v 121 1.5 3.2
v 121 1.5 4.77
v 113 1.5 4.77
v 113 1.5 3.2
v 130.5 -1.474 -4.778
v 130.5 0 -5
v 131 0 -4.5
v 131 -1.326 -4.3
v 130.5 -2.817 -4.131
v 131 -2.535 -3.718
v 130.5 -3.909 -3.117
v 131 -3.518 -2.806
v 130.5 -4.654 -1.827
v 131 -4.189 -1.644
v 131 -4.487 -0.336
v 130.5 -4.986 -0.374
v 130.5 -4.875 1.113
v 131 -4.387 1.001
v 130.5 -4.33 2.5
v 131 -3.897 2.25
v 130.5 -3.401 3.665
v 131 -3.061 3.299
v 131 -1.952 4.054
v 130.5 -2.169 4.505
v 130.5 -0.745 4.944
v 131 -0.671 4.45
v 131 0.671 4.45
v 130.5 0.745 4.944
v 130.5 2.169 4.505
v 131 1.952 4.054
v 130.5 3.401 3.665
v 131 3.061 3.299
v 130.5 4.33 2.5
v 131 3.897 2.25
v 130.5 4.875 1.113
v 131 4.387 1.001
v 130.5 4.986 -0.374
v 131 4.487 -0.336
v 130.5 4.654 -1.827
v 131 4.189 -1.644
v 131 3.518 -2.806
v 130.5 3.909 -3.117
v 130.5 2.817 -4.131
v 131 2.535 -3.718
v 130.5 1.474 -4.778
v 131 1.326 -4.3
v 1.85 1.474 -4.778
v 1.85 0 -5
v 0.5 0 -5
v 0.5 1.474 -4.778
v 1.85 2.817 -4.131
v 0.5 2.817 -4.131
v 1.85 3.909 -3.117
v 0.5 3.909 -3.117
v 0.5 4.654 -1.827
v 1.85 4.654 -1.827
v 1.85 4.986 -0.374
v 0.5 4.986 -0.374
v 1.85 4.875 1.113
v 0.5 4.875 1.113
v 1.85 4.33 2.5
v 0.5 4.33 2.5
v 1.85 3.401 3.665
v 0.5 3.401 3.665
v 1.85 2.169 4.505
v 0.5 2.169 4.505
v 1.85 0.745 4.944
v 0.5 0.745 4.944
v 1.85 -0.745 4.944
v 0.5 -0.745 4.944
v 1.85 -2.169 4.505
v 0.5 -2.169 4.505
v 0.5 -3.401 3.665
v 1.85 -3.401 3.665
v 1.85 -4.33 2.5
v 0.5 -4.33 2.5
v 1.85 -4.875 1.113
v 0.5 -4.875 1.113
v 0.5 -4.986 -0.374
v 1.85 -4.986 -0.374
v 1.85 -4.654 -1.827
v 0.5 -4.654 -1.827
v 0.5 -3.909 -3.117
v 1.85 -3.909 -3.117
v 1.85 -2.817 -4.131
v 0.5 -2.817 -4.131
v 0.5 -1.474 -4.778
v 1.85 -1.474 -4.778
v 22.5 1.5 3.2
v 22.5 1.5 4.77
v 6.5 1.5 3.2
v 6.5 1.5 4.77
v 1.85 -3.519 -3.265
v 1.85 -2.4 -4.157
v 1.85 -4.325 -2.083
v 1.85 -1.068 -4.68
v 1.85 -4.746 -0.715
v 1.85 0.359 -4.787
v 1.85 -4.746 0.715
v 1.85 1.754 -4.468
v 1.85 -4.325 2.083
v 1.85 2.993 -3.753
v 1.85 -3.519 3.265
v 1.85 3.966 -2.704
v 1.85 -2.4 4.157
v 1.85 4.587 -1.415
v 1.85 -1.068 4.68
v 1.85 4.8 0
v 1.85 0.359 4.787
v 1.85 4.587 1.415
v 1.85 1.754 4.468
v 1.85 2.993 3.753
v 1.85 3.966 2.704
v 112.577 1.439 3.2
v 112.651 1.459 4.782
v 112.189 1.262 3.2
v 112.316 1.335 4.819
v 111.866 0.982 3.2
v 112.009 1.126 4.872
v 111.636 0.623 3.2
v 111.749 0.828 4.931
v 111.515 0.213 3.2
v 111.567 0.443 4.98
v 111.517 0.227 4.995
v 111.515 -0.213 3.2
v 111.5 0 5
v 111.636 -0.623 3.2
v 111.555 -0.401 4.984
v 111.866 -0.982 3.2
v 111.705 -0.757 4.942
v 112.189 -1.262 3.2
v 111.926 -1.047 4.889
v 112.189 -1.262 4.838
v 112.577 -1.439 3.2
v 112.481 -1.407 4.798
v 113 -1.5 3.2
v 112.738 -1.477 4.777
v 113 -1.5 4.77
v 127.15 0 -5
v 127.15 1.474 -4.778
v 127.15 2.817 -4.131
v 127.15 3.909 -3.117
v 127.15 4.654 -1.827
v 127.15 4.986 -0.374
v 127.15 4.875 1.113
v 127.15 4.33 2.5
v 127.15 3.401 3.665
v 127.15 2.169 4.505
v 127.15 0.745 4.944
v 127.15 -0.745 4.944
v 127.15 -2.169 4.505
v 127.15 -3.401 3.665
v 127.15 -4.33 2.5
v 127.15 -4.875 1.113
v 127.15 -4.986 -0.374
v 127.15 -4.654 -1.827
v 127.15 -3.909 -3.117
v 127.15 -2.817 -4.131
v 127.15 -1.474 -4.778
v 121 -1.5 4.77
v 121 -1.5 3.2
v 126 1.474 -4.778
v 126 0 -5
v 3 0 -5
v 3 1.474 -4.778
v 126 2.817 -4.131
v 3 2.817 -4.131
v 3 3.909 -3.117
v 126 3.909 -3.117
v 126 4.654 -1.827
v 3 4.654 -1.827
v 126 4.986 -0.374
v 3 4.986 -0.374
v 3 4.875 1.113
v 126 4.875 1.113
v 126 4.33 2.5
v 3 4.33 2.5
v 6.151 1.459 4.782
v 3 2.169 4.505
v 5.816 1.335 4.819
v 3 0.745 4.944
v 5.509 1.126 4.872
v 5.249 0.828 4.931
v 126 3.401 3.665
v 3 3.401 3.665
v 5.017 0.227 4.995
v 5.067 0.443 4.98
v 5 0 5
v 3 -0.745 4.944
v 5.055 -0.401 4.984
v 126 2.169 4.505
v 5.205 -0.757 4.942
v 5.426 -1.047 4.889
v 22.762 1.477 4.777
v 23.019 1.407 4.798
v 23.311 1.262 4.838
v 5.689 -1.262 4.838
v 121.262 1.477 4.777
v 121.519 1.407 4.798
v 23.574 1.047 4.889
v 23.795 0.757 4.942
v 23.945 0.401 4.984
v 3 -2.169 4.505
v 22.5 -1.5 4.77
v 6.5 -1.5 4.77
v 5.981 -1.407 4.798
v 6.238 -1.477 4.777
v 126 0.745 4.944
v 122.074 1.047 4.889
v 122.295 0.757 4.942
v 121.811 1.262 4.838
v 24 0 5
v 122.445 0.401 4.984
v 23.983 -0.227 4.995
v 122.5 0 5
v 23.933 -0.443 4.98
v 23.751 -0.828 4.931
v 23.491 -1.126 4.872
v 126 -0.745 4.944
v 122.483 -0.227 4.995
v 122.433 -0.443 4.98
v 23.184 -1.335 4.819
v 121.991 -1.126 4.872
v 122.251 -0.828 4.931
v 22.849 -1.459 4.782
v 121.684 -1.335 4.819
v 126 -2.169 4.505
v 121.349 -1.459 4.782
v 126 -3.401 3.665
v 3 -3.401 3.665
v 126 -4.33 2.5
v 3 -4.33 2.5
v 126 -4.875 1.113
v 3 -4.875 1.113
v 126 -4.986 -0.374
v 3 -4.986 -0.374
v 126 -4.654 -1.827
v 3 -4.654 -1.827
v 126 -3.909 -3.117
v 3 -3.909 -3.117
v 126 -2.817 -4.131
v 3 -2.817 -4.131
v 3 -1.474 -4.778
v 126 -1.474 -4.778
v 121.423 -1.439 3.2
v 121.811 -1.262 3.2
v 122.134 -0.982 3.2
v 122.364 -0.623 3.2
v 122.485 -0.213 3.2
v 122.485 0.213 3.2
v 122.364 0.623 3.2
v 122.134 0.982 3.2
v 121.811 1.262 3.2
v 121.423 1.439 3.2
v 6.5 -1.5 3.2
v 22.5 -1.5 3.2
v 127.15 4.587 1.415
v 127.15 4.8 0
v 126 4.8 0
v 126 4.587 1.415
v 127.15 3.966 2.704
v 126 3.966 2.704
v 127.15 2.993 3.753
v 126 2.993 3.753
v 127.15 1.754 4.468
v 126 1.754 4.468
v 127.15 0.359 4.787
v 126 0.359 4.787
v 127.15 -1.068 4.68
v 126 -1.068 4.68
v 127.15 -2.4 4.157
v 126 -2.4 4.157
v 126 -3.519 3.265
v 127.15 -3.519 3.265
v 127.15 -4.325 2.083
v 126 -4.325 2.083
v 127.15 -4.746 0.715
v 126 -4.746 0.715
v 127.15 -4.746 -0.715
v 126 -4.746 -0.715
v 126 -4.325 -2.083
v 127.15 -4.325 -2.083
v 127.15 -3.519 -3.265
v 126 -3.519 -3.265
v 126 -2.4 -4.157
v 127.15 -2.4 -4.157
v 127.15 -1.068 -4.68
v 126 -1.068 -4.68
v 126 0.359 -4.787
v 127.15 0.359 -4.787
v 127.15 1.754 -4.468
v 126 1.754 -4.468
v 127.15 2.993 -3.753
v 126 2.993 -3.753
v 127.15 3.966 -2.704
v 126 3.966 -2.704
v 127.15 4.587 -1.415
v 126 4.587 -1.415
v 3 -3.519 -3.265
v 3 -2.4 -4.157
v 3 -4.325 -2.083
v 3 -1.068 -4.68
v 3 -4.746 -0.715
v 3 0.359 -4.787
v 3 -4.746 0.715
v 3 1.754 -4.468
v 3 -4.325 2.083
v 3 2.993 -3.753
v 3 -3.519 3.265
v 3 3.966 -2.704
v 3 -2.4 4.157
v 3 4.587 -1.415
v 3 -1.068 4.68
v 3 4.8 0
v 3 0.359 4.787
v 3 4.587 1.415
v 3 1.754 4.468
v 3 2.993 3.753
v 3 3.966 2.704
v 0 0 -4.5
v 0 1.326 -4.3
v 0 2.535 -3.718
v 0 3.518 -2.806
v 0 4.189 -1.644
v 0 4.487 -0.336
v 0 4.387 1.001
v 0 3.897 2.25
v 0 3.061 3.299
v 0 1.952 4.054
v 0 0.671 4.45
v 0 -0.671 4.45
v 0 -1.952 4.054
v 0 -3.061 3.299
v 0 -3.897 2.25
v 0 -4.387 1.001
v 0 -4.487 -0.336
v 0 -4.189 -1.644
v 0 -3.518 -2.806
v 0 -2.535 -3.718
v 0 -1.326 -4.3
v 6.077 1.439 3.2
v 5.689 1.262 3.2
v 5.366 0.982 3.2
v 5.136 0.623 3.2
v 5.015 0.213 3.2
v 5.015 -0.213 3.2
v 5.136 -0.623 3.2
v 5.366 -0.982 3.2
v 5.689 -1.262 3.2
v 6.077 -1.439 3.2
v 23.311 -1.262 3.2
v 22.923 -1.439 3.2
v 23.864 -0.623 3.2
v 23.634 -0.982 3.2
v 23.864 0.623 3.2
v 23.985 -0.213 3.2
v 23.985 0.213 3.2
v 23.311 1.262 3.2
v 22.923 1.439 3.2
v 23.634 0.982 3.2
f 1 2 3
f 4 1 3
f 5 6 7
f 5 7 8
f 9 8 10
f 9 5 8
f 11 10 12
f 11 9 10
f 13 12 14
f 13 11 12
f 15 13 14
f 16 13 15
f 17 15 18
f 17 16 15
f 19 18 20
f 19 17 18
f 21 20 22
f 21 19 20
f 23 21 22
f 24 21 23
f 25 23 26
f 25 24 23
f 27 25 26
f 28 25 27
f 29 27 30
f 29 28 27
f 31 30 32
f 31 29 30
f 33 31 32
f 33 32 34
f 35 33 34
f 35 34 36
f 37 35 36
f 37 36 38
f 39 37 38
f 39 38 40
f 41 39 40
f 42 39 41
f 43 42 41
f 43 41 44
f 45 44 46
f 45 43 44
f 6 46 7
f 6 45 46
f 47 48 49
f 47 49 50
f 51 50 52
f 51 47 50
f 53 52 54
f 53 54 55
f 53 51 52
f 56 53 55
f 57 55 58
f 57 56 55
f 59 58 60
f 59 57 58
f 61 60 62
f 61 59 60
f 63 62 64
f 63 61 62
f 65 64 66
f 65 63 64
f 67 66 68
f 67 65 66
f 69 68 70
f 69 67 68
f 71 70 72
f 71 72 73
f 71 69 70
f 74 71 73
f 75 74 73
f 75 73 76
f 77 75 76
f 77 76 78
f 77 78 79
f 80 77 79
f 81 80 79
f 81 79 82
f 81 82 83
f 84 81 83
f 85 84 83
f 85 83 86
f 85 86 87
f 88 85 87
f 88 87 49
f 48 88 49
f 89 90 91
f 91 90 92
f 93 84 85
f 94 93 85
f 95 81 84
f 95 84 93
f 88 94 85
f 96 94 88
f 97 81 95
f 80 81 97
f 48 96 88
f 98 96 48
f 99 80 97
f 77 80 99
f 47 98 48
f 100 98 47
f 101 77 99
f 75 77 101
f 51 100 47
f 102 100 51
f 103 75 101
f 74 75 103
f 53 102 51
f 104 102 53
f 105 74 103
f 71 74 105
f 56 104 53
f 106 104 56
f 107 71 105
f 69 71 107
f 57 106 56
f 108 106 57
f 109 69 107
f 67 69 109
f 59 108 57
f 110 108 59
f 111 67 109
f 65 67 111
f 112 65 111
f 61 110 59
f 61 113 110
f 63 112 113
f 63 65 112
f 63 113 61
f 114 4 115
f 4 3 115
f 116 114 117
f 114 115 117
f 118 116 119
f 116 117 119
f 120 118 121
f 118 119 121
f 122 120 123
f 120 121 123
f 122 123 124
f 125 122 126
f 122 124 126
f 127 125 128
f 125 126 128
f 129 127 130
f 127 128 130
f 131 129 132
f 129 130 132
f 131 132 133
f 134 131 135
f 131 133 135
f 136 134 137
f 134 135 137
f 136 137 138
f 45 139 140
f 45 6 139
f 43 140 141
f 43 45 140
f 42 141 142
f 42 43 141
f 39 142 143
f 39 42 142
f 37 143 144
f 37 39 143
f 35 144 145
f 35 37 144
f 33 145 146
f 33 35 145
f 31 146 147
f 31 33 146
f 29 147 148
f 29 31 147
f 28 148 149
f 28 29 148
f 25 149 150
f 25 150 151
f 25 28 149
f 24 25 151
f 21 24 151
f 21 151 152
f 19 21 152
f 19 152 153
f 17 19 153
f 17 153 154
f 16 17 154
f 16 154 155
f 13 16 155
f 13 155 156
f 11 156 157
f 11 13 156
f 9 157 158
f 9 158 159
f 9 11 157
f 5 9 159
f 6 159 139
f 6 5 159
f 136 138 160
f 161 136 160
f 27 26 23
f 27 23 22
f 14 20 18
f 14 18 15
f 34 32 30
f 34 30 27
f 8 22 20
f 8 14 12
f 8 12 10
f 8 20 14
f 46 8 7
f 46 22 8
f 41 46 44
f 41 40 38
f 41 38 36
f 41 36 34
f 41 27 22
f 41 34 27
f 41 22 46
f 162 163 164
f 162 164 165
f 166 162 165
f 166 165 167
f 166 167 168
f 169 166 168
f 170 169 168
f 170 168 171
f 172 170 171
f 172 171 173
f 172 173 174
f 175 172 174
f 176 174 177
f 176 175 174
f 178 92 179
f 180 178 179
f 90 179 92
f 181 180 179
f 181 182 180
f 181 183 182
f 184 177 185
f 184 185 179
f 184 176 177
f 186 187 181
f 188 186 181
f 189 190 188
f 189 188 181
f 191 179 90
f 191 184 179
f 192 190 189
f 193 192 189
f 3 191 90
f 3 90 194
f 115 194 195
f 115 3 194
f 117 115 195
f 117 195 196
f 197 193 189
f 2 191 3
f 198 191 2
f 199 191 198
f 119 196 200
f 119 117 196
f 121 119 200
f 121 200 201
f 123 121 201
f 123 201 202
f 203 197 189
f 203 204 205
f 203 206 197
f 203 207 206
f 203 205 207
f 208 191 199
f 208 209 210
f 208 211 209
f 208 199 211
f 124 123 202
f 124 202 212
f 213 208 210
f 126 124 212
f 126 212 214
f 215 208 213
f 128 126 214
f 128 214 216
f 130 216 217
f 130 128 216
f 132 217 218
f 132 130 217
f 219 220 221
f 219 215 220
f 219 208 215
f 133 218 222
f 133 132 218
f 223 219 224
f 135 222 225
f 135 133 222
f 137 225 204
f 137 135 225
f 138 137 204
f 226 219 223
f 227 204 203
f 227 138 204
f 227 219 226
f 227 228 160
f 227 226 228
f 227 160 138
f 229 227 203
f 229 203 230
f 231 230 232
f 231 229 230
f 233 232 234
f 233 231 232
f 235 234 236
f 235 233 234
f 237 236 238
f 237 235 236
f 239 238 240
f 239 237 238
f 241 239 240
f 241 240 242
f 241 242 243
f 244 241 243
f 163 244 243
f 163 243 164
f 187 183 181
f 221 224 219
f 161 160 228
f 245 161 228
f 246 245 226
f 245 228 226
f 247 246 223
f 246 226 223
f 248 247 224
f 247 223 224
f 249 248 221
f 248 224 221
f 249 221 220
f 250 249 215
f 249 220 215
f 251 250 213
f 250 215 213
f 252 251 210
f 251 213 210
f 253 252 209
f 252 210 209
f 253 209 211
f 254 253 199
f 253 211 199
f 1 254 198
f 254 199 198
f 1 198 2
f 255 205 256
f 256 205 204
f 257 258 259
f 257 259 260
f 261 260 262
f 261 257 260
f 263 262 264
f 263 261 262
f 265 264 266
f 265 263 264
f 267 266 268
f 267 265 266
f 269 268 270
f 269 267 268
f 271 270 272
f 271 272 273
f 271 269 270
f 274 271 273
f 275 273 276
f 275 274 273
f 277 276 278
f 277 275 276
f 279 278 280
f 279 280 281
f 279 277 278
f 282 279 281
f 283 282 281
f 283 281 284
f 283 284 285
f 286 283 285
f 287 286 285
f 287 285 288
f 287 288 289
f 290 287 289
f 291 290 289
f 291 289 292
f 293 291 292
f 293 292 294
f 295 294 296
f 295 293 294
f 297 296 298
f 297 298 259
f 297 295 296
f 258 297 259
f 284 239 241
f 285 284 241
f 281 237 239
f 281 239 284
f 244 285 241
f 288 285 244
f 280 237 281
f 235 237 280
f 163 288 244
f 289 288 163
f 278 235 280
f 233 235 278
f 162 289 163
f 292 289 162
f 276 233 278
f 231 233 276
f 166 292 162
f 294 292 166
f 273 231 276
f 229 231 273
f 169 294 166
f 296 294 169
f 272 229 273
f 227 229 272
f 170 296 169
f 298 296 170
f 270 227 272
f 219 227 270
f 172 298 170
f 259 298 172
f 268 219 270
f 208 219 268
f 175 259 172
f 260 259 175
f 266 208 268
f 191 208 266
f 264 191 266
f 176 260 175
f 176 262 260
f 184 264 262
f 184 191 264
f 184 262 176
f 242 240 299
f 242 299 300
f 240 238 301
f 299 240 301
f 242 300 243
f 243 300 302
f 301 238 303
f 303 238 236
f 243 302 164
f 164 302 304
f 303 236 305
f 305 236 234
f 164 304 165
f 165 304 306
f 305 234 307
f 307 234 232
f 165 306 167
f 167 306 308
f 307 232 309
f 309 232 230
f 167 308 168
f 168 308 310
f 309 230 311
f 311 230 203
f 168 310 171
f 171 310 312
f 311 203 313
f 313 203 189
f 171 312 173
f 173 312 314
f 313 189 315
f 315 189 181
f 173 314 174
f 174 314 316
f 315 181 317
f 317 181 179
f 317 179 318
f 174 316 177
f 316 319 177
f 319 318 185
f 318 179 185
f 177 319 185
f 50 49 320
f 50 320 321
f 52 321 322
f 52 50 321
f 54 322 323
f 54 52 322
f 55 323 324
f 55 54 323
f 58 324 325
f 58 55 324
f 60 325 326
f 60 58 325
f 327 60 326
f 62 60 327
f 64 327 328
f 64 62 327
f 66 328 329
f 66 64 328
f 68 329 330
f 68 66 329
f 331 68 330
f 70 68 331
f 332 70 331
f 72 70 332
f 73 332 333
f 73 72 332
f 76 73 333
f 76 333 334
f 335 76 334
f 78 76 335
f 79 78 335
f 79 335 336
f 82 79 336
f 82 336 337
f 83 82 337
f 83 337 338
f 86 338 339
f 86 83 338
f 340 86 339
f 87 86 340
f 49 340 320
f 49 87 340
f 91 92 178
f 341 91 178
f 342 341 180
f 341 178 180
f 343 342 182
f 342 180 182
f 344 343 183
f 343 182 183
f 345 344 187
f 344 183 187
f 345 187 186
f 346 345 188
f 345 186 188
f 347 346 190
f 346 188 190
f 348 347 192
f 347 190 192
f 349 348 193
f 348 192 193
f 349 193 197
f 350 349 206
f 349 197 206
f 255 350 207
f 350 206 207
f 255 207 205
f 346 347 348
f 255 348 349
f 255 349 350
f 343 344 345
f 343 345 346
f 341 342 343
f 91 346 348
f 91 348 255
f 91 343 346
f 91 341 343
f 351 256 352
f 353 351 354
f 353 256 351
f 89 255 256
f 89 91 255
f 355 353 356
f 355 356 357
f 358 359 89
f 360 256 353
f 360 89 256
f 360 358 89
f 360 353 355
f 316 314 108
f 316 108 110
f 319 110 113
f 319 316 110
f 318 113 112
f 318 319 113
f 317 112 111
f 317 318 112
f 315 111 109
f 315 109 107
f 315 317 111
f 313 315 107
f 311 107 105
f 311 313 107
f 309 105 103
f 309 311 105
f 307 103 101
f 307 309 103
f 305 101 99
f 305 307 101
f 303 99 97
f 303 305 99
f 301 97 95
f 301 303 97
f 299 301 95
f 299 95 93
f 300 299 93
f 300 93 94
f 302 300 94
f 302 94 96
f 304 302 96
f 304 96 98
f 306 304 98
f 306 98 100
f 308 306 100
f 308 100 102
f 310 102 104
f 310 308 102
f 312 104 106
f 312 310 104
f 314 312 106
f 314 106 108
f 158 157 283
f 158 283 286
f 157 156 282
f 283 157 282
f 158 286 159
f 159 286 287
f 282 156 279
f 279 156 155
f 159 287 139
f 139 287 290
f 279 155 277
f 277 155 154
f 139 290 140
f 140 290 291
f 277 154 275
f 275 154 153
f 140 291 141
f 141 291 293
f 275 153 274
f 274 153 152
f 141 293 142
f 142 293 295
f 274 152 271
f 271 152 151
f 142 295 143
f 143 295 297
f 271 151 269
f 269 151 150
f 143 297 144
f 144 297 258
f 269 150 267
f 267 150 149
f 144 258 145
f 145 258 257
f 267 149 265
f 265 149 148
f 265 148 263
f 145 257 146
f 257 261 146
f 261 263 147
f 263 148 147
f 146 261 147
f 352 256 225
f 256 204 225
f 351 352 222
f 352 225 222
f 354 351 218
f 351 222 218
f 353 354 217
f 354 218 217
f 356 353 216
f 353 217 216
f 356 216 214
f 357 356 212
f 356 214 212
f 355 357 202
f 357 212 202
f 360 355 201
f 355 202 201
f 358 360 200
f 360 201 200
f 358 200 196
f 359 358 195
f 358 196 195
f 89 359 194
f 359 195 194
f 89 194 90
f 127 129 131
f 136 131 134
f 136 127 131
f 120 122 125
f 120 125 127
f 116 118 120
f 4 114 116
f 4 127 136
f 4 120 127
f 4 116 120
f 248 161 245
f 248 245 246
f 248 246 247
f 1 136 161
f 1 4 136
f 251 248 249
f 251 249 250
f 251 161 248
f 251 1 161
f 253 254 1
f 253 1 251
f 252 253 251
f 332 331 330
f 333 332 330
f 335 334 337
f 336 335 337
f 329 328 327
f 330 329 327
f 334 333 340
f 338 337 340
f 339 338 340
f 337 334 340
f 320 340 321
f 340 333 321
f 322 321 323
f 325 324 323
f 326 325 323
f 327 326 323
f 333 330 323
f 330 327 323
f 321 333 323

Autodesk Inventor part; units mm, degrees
sketch "Sketch_1" plane through (0, 0, 0) normal (0, 1, 0) x (-1, 0, 0)
  line L0 (-131, 0) -> (0, 0)
  line L1 (0, 0) -> (0, -4.5)
  line L2 (0, -4.5) -> (-0.5, -5)
  line L3 (-0.5, -5) -> (-130.5, -5)
  line L4 (-130.5, -5) -> (-131, -4.5)
  line L5 (-131, -4.5) -> (-131, 0)
  line L6 (-131, 0) -> (0, 0)
revolve "Revolution1" add sketch "Sketch_1" angle 360 about axis through (131, 0, 0) along (1, 0, 0)
sketch "Sketch_27" plane through (0, 0, 0) normal (0, 0, 1) x (1, 0, 0)
  line L0 (131, 0) -> (-131, 0)
  line L1 (1.85, 9.6) -> (1.85, 4.8)
  line L2 (1.85, 4.8) -> (3, 4.8)
  line L3 (3, 4.8) -> (3, 9.6)
  line L4 (3, 9.6) -> (1.85, 9.6)
revolve "Revolution2" cut sketch "Sketch_27" angle 360 about axis through (131, 0, 0) along (1, 0, 0)
sketch "Sketch_39" plane through (0, 0, 0) normal (0, 0, 1) x (1, 0, 0)
  line L0 (131, 0) -> (-131, 0)
  line L1 (126, 9.6) -> (126, 4.8)
  line L2 (126, 4.8) -> (127.15, 4.8)
  line L3 (127.15, 4.8) -> (127.15, 9.6)
  line L4 (127.15, 9.6) -> (126, 9.6)
revolve "Revolution3" cut sketch "Sketch_39" angle 360 about axis through (131, 0, 0) along (1, 0, 0)
sketch "_____7" plane through (0, 0, 5) normal (0, 0, 1) x (1, 0, 0)
  arc A0 (6.5, 1.5) -> (6.5, -1.5) centre (6.5, 0) ccw
  line L0 (6.5, -1.5) -> (22.5, -1.5)
  arc A1 (22.5, -1.5) -> (22.5, 1.5) centre (22.5, 0) ccw
  line L1 (22.5, 1.5) -> (6.5, 1.5)
extrude "Extrusion1" cut sketch "_____7" against normal blind 1.8
sketch "_____10" plane through (0, 0, 5) normal (0, 0, 1) x (1, 0, 0)
  arc A0 (113, 1.5) -> (113, -1.5) centre (113, 0) ccw
  line L0 (113, -1.5) -> (121, -1.5)
  arc A1 (121, -1.5) -> (121, 1.5) centre (121, 0) ccw
  line L1 (121, 1.5) -> (113, 1.5)
extrude "Extrusion2" cut sketch "_____10" against normal blind 1.8
ref_plane "to_rring_1_XY" through (2.425, 0, 0) normal (1, 0, 0) x (0, 0, -1)
ref_plane "to_rring_1_YZ" through (2.425, 0, 0) normal (0, 0, -1) x (0, 1, 0)
ref_plane "to_rring_1_ZX" through (2.425, 0, 0) normal (0, 1, 0) x (1, 0, 0)
ref_plane "to_rring_2_XY" through (126.575, 0, 0) normal (1, 0, 0) x (0, 0, -1)
ref_plane "to_rring_2_YZ" through (126.575, 0, 0) normal (0, 0, -1) x (0, 1, 0)
ref_plane "to_rring_2_ZX" through (126.575, 0, 0) normal (0, 1, 0) x (1, 0, 0)
properties part number "NSFMKRRA10-131-F3-S5-KA5-A19-KB111.5-B11_s"
